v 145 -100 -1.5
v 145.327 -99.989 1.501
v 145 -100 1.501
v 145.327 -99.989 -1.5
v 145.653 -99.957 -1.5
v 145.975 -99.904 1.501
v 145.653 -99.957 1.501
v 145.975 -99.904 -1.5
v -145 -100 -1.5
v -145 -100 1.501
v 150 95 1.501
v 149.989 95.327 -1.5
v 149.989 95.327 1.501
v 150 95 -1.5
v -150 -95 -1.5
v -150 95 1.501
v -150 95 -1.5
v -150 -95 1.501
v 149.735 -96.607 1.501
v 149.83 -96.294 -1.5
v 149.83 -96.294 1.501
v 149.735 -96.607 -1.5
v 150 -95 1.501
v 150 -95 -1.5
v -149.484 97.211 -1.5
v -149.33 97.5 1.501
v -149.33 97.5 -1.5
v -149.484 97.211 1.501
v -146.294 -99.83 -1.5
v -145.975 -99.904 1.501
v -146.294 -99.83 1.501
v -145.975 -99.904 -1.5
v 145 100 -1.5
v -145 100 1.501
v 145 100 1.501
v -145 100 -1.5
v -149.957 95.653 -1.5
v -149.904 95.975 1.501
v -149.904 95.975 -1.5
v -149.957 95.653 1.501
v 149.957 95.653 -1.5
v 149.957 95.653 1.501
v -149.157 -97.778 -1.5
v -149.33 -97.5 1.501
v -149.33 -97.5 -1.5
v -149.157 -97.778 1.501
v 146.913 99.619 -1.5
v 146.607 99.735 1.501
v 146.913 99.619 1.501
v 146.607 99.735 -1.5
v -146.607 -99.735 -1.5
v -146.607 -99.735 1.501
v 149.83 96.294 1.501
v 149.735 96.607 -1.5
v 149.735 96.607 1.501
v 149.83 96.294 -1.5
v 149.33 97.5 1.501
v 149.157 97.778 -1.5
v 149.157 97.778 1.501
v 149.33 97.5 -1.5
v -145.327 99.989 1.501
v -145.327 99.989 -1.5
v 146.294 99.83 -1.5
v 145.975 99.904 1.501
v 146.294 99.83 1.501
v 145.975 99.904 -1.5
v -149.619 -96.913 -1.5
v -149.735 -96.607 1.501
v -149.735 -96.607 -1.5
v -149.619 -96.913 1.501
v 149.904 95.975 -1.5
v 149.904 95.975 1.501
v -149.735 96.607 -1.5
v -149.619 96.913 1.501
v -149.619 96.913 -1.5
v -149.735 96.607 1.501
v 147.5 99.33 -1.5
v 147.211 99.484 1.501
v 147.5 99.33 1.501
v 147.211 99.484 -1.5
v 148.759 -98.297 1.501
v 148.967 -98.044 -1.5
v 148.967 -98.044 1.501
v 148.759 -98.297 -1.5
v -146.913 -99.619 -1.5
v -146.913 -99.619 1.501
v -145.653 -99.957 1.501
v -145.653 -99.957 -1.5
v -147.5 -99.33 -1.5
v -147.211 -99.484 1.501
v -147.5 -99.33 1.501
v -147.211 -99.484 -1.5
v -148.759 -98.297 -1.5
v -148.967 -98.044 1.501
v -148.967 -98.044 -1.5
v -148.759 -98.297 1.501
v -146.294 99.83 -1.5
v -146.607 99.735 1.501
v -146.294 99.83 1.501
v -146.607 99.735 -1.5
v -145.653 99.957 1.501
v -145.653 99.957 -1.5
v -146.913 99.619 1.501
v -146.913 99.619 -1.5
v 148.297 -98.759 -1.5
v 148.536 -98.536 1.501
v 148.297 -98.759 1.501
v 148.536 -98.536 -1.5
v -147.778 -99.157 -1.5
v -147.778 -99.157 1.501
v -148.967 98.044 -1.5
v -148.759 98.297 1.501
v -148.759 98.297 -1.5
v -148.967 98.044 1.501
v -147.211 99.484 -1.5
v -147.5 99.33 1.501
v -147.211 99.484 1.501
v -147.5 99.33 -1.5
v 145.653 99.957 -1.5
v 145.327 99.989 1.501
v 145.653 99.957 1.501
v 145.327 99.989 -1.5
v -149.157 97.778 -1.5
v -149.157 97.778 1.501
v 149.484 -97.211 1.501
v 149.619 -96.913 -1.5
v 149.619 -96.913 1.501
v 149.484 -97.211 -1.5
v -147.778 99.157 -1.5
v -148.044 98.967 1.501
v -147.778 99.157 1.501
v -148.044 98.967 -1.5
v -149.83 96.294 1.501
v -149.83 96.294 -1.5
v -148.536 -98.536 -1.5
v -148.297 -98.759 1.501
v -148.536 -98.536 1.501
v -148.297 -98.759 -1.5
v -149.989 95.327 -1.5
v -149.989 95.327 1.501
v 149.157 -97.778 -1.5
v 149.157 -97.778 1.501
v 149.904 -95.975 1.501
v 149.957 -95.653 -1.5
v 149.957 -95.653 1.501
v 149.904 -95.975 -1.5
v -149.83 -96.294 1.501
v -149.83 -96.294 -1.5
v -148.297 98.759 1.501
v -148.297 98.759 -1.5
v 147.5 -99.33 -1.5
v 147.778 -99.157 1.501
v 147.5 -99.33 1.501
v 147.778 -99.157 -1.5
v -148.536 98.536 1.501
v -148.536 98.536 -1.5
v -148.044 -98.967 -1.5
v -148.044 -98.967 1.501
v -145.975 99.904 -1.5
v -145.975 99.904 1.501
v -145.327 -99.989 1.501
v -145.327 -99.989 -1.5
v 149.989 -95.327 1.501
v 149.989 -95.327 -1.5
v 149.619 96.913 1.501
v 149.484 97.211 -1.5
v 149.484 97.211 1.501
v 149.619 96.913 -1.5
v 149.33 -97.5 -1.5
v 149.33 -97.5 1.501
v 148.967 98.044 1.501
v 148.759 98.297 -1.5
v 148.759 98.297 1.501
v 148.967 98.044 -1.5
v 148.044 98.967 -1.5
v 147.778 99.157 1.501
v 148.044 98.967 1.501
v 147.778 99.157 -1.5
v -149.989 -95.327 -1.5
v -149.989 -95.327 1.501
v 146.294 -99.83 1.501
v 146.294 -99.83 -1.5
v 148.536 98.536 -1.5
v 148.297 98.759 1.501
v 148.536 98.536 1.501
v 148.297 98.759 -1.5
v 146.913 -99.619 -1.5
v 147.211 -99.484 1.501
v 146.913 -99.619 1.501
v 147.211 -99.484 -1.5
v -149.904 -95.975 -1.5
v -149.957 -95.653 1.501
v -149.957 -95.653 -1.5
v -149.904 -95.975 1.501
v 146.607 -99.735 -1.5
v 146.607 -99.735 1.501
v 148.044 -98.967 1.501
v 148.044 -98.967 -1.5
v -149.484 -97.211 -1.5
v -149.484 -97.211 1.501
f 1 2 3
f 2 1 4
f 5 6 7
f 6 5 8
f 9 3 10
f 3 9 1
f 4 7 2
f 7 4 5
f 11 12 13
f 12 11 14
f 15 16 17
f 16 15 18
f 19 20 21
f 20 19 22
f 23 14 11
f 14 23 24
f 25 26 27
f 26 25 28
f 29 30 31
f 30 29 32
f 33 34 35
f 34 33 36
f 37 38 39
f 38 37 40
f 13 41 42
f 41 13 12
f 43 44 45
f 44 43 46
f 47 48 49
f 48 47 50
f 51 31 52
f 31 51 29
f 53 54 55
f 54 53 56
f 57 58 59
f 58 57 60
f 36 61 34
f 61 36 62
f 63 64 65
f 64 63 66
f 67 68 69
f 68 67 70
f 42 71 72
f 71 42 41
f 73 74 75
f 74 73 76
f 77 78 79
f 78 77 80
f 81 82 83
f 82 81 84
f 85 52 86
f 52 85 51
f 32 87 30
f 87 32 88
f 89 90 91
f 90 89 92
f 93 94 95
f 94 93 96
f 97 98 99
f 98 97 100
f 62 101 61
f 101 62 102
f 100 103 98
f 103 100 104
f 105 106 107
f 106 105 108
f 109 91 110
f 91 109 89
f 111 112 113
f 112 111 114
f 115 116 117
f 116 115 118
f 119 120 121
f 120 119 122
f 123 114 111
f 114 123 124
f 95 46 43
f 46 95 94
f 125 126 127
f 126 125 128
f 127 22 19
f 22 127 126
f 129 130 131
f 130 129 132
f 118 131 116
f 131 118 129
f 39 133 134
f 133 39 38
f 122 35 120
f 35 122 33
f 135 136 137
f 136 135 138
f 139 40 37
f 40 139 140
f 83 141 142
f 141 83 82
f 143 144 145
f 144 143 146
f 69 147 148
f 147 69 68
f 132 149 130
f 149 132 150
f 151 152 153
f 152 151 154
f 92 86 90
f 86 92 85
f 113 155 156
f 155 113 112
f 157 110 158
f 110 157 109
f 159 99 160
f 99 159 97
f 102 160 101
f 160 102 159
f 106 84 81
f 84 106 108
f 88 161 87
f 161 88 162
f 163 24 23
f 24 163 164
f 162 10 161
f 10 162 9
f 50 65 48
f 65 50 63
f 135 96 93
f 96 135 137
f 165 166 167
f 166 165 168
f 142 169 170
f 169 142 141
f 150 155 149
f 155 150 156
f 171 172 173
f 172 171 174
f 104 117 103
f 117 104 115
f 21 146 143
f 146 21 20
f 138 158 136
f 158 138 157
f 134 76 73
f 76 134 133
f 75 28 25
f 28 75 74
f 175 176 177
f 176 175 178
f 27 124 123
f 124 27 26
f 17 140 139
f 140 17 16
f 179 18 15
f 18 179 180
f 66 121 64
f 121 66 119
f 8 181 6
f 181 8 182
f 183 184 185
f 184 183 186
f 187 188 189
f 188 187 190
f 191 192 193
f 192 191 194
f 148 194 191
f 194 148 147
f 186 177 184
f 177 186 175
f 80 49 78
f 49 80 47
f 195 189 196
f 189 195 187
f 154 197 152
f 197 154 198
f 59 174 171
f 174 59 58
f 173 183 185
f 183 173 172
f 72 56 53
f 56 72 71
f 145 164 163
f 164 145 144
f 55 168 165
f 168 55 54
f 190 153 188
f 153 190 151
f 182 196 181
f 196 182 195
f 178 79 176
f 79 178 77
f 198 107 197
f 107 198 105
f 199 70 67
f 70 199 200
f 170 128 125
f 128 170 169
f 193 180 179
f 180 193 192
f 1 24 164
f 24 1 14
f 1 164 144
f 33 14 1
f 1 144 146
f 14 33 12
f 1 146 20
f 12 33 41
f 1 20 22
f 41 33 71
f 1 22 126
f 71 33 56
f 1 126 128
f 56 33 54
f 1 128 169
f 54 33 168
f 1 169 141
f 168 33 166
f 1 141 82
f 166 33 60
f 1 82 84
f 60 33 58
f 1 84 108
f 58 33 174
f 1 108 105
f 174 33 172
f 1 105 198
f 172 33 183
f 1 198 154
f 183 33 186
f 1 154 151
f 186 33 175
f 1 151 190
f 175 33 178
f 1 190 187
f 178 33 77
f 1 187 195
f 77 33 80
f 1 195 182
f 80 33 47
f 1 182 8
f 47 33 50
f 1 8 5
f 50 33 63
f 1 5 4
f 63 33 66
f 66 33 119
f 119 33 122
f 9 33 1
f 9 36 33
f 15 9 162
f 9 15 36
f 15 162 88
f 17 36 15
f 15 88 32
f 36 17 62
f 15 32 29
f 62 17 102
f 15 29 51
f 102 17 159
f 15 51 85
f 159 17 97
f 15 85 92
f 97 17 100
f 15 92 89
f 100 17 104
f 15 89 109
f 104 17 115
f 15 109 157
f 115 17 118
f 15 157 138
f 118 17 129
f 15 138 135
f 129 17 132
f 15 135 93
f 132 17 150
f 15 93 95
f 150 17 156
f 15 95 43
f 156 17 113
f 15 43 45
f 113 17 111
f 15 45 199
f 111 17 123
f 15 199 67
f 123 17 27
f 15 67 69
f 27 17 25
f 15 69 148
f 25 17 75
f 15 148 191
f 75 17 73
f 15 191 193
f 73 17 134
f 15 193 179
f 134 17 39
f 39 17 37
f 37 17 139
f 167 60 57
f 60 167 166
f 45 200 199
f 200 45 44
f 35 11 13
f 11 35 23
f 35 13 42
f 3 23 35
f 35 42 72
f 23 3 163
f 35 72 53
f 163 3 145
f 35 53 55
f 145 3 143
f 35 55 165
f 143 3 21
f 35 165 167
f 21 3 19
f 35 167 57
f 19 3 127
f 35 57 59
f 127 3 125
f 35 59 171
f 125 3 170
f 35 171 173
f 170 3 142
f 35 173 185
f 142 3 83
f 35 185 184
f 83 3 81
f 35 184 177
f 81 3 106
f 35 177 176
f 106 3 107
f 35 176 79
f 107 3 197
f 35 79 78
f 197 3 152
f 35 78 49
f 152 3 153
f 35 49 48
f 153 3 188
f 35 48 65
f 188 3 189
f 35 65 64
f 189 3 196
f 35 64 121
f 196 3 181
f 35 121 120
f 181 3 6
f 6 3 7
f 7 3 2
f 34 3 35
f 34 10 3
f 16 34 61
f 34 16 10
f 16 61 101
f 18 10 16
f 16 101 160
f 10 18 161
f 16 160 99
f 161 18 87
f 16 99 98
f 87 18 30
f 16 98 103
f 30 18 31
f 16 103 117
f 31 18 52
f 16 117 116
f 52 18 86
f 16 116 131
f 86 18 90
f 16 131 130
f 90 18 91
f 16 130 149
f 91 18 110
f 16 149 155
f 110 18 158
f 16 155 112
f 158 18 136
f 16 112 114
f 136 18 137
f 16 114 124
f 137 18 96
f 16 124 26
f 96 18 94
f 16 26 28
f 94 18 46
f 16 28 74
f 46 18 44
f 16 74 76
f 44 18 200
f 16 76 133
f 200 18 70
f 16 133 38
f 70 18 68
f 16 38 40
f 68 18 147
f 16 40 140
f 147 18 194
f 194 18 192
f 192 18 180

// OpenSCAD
// Parameters
sheet_length = 300; //[150:600:1]
sheet_width = 200;  //[100:400:1]
sheet_thickness = 3; //[1.5:6:0.1]
corner_radius = 5;  //[0:20:0.5]
film_thickness = 0.1; //[0.05:0.3:0.01]
overlap = 0.2; //[0.05:1:0.01]

$fn = 96;

// Helpers
function clamp(v, lo, hi) = v < lo ? lo : (v > hi ? hi : v);

min_dim = min(sheet_length, sheet_width);
cr = clamp(corner_radius, 0, min_dim/2 - 0.001);

// Ensure valid 2D core size for offset()
core_L = max(sheet_length - 2*cr, 0.01);
core_W = max(sheet_width  - 2*cr, 0.01);

// Keep overlap sane so film always intersects sheet
ov = clamp(overlap, 0.001, film_thickness - 0.001);

// 2D rounded rectangle (robust)
module rounded_rect_2d(L, W, R) {
  if (R <= 0)
    square([L, W], center=true);
  else
    offset(r=R) square([L, W], center=true);
}

// Acrylic sheet (single solid; film is fused into it via overlap)
module acrylic_with_film() {
  // Visual acrylic tint (translucent)
  color([0.85, 0.95, 1.0, 0.25])
  union() {
    // Main sheet
    linear_extrude(height=sheet_thickness, center=true, convexity=10)
      rounded_rect_2d(core_L, core_W, cr);

    // Protective film fused to top surface (overlaps into sheet)
    translate([0, 0, sheet_thickness/2 + film_thickness/2 - ov])
      linear_extrude(height=film_thickness, center=true, convexity=10)
        rounded_rect_2d(core_L, core_W, cr);
  }
}

// Final Model (ONE connected solid)
acrylic_with_film();
